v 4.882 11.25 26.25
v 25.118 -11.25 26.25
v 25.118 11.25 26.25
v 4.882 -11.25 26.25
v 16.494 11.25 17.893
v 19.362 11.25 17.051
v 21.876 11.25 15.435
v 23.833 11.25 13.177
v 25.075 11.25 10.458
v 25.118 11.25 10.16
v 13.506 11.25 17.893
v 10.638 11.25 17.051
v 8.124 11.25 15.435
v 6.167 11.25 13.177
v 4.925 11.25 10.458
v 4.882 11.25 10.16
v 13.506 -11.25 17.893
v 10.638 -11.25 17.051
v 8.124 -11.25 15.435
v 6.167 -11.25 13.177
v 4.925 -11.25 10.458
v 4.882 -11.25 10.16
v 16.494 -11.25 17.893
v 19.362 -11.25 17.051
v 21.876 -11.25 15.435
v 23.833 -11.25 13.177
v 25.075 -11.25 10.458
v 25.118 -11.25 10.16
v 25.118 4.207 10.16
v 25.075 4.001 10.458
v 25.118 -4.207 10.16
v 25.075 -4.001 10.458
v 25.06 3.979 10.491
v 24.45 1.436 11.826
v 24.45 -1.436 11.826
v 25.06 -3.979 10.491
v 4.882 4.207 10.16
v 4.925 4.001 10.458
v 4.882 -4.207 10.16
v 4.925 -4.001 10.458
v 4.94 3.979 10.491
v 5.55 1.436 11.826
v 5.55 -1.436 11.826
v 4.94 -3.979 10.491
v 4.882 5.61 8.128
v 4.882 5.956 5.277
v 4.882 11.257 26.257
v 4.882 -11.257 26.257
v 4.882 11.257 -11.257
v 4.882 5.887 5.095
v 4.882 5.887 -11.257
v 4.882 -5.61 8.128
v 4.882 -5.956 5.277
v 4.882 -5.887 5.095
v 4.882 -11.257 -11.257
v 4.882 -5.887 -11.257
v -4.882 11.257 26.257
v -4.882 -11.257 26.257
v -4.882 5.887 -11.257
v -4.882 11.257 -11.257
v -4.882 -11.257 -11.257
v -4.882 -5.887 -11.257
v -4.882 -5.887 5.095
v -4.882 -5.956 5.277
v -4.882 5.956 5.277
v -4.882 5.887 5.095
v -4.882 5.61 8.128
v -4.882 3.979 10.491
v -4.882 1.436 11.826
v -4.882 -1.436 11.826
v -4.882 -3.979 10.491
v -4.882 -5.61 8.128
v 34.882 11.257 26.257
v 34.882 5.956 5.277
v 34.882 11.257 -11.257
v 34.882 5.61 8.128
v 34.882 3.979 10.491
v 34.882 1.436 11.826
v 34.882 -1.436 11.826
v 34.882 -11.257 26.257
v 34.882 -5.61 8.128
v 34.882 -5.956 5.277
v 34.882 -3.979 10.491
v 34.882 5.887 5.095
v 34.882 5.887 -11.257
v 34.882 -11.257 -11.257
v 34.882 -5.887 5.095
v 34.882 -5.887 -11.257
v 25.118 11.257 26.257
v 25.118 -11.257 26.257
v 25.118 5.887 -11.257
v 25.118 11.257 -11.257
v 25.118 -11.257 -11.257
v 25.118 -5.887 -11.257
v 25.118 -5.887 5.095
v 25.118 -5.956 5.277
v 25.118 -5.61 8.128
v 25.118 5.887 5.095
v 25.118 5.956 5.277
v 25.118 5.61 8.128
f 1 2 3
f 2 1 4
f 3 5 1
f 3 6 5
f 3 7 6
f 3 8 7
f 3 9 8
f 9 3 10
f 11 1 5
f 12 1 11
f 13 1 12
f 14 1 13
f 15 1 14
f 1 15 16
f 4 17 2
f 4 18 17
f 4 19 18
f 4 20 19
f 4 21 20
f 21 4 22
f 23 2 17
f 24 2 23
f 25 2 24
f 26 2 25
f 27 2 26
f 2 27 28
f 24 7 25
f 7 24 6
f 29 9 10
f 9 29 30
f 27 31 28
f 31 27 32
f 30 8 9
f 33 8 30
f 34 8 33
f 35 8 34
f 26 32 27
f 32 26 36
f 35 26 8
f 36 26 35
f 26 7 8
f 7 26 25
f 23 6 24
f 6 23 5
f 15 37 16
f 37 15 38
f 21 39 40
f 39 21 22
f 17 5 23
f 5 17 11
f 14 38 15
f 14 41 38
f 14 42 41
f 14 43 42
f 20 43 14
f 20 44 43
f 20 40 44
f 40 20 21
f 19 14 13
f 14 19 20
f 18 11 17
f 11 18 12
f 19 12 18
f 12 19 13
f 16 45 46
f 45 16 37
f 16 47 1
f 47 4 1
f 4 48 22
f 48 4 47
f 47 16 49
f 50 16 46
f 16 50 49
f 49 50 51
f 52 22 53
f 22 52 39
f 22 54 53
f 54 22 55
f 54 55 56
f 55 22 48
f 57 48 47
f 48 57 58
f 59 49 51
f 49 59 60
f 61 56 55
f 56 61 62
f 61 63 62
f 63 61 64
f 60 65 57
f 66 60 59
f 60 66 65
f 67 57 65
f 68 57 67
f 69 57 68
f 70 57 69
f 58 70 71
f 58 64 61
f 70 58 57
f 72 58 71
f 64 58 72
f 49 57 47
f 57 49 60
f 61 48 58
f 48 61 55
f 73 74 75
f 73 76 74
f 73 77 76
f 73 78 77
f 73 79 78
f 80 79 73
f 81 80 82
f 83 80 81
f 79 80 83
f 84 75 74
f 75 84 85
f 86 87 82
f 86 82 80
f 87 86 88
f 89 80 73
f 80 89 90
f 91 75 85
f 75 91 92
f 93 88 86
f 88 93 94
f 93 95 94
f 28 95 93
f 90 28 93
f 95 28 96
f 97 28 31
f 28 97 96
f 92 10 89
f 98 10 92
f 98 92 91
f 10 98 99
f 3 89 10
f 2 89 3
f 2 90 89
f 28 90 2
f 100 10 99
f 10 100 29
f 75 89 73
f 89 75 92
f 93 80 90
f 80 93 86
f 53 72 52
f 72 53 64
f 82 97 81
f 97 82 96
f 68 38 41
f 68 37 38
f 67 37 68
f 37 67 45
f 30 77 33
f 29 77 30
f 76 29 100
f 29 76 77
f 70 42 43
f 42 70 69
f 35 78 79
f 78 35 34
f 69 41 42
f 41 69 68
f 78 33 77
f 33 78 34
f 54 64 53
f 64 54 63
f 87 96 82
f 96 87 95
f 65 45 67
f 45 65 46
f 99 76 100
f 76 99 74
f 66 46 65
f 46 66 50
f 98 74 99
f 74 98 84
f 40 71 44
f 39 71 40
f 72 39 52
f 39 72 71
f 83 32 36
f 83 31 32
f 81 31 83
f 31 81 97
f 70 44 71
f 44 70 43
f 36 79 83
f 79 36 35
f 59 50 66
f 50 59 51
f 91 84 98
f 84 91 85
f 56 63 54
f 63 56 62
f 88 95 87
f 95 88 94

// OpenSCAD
scale([1.500000, 1.500000, 1.500000]) 
difference() {
    union() {
    translate([0.000000, 0.000000, 5.000000]) 
        color([0.000000, 0.000000, 1.000000]) 
        cube([6.510000, 15.010000, 25.010000], true);
        
    translate([20.000000, 0.000000, 5.000000]) 
        color([1.000000, 0.000000, 0.000000]) 
        cube([6.510000, 15.010000, 25.010000], true);
        
        color([1.000000, 1.000000, 1.000000]) 
        difference() {
            translate([10.000000, 0.000000, 10.000000]) 
            rotate([0.000000, 90.000000, 0.000000]) 
            cube([15.000000, 15.000000, 26.000000], true);
            translate([10.000000, 0.000000, 5.000000]) 
            rotate([90.000000, 0.000000, 0.000000]) 
            cylinder(15.010000, 7.000000, 7.000000, true);
            translate([10.000000, 0.000000, -1.000000]) 
            cube([13.860000, 15.000000, 14.000000], true);
        }
    }
    
    union() {
        translate([10, 0, 4]) rotate([0,90,0])
        cylinder(30, 4, 4, true);
        translate([10, 0, -2])
        cube([30, 7.85, 11.5], true);
    }
}
